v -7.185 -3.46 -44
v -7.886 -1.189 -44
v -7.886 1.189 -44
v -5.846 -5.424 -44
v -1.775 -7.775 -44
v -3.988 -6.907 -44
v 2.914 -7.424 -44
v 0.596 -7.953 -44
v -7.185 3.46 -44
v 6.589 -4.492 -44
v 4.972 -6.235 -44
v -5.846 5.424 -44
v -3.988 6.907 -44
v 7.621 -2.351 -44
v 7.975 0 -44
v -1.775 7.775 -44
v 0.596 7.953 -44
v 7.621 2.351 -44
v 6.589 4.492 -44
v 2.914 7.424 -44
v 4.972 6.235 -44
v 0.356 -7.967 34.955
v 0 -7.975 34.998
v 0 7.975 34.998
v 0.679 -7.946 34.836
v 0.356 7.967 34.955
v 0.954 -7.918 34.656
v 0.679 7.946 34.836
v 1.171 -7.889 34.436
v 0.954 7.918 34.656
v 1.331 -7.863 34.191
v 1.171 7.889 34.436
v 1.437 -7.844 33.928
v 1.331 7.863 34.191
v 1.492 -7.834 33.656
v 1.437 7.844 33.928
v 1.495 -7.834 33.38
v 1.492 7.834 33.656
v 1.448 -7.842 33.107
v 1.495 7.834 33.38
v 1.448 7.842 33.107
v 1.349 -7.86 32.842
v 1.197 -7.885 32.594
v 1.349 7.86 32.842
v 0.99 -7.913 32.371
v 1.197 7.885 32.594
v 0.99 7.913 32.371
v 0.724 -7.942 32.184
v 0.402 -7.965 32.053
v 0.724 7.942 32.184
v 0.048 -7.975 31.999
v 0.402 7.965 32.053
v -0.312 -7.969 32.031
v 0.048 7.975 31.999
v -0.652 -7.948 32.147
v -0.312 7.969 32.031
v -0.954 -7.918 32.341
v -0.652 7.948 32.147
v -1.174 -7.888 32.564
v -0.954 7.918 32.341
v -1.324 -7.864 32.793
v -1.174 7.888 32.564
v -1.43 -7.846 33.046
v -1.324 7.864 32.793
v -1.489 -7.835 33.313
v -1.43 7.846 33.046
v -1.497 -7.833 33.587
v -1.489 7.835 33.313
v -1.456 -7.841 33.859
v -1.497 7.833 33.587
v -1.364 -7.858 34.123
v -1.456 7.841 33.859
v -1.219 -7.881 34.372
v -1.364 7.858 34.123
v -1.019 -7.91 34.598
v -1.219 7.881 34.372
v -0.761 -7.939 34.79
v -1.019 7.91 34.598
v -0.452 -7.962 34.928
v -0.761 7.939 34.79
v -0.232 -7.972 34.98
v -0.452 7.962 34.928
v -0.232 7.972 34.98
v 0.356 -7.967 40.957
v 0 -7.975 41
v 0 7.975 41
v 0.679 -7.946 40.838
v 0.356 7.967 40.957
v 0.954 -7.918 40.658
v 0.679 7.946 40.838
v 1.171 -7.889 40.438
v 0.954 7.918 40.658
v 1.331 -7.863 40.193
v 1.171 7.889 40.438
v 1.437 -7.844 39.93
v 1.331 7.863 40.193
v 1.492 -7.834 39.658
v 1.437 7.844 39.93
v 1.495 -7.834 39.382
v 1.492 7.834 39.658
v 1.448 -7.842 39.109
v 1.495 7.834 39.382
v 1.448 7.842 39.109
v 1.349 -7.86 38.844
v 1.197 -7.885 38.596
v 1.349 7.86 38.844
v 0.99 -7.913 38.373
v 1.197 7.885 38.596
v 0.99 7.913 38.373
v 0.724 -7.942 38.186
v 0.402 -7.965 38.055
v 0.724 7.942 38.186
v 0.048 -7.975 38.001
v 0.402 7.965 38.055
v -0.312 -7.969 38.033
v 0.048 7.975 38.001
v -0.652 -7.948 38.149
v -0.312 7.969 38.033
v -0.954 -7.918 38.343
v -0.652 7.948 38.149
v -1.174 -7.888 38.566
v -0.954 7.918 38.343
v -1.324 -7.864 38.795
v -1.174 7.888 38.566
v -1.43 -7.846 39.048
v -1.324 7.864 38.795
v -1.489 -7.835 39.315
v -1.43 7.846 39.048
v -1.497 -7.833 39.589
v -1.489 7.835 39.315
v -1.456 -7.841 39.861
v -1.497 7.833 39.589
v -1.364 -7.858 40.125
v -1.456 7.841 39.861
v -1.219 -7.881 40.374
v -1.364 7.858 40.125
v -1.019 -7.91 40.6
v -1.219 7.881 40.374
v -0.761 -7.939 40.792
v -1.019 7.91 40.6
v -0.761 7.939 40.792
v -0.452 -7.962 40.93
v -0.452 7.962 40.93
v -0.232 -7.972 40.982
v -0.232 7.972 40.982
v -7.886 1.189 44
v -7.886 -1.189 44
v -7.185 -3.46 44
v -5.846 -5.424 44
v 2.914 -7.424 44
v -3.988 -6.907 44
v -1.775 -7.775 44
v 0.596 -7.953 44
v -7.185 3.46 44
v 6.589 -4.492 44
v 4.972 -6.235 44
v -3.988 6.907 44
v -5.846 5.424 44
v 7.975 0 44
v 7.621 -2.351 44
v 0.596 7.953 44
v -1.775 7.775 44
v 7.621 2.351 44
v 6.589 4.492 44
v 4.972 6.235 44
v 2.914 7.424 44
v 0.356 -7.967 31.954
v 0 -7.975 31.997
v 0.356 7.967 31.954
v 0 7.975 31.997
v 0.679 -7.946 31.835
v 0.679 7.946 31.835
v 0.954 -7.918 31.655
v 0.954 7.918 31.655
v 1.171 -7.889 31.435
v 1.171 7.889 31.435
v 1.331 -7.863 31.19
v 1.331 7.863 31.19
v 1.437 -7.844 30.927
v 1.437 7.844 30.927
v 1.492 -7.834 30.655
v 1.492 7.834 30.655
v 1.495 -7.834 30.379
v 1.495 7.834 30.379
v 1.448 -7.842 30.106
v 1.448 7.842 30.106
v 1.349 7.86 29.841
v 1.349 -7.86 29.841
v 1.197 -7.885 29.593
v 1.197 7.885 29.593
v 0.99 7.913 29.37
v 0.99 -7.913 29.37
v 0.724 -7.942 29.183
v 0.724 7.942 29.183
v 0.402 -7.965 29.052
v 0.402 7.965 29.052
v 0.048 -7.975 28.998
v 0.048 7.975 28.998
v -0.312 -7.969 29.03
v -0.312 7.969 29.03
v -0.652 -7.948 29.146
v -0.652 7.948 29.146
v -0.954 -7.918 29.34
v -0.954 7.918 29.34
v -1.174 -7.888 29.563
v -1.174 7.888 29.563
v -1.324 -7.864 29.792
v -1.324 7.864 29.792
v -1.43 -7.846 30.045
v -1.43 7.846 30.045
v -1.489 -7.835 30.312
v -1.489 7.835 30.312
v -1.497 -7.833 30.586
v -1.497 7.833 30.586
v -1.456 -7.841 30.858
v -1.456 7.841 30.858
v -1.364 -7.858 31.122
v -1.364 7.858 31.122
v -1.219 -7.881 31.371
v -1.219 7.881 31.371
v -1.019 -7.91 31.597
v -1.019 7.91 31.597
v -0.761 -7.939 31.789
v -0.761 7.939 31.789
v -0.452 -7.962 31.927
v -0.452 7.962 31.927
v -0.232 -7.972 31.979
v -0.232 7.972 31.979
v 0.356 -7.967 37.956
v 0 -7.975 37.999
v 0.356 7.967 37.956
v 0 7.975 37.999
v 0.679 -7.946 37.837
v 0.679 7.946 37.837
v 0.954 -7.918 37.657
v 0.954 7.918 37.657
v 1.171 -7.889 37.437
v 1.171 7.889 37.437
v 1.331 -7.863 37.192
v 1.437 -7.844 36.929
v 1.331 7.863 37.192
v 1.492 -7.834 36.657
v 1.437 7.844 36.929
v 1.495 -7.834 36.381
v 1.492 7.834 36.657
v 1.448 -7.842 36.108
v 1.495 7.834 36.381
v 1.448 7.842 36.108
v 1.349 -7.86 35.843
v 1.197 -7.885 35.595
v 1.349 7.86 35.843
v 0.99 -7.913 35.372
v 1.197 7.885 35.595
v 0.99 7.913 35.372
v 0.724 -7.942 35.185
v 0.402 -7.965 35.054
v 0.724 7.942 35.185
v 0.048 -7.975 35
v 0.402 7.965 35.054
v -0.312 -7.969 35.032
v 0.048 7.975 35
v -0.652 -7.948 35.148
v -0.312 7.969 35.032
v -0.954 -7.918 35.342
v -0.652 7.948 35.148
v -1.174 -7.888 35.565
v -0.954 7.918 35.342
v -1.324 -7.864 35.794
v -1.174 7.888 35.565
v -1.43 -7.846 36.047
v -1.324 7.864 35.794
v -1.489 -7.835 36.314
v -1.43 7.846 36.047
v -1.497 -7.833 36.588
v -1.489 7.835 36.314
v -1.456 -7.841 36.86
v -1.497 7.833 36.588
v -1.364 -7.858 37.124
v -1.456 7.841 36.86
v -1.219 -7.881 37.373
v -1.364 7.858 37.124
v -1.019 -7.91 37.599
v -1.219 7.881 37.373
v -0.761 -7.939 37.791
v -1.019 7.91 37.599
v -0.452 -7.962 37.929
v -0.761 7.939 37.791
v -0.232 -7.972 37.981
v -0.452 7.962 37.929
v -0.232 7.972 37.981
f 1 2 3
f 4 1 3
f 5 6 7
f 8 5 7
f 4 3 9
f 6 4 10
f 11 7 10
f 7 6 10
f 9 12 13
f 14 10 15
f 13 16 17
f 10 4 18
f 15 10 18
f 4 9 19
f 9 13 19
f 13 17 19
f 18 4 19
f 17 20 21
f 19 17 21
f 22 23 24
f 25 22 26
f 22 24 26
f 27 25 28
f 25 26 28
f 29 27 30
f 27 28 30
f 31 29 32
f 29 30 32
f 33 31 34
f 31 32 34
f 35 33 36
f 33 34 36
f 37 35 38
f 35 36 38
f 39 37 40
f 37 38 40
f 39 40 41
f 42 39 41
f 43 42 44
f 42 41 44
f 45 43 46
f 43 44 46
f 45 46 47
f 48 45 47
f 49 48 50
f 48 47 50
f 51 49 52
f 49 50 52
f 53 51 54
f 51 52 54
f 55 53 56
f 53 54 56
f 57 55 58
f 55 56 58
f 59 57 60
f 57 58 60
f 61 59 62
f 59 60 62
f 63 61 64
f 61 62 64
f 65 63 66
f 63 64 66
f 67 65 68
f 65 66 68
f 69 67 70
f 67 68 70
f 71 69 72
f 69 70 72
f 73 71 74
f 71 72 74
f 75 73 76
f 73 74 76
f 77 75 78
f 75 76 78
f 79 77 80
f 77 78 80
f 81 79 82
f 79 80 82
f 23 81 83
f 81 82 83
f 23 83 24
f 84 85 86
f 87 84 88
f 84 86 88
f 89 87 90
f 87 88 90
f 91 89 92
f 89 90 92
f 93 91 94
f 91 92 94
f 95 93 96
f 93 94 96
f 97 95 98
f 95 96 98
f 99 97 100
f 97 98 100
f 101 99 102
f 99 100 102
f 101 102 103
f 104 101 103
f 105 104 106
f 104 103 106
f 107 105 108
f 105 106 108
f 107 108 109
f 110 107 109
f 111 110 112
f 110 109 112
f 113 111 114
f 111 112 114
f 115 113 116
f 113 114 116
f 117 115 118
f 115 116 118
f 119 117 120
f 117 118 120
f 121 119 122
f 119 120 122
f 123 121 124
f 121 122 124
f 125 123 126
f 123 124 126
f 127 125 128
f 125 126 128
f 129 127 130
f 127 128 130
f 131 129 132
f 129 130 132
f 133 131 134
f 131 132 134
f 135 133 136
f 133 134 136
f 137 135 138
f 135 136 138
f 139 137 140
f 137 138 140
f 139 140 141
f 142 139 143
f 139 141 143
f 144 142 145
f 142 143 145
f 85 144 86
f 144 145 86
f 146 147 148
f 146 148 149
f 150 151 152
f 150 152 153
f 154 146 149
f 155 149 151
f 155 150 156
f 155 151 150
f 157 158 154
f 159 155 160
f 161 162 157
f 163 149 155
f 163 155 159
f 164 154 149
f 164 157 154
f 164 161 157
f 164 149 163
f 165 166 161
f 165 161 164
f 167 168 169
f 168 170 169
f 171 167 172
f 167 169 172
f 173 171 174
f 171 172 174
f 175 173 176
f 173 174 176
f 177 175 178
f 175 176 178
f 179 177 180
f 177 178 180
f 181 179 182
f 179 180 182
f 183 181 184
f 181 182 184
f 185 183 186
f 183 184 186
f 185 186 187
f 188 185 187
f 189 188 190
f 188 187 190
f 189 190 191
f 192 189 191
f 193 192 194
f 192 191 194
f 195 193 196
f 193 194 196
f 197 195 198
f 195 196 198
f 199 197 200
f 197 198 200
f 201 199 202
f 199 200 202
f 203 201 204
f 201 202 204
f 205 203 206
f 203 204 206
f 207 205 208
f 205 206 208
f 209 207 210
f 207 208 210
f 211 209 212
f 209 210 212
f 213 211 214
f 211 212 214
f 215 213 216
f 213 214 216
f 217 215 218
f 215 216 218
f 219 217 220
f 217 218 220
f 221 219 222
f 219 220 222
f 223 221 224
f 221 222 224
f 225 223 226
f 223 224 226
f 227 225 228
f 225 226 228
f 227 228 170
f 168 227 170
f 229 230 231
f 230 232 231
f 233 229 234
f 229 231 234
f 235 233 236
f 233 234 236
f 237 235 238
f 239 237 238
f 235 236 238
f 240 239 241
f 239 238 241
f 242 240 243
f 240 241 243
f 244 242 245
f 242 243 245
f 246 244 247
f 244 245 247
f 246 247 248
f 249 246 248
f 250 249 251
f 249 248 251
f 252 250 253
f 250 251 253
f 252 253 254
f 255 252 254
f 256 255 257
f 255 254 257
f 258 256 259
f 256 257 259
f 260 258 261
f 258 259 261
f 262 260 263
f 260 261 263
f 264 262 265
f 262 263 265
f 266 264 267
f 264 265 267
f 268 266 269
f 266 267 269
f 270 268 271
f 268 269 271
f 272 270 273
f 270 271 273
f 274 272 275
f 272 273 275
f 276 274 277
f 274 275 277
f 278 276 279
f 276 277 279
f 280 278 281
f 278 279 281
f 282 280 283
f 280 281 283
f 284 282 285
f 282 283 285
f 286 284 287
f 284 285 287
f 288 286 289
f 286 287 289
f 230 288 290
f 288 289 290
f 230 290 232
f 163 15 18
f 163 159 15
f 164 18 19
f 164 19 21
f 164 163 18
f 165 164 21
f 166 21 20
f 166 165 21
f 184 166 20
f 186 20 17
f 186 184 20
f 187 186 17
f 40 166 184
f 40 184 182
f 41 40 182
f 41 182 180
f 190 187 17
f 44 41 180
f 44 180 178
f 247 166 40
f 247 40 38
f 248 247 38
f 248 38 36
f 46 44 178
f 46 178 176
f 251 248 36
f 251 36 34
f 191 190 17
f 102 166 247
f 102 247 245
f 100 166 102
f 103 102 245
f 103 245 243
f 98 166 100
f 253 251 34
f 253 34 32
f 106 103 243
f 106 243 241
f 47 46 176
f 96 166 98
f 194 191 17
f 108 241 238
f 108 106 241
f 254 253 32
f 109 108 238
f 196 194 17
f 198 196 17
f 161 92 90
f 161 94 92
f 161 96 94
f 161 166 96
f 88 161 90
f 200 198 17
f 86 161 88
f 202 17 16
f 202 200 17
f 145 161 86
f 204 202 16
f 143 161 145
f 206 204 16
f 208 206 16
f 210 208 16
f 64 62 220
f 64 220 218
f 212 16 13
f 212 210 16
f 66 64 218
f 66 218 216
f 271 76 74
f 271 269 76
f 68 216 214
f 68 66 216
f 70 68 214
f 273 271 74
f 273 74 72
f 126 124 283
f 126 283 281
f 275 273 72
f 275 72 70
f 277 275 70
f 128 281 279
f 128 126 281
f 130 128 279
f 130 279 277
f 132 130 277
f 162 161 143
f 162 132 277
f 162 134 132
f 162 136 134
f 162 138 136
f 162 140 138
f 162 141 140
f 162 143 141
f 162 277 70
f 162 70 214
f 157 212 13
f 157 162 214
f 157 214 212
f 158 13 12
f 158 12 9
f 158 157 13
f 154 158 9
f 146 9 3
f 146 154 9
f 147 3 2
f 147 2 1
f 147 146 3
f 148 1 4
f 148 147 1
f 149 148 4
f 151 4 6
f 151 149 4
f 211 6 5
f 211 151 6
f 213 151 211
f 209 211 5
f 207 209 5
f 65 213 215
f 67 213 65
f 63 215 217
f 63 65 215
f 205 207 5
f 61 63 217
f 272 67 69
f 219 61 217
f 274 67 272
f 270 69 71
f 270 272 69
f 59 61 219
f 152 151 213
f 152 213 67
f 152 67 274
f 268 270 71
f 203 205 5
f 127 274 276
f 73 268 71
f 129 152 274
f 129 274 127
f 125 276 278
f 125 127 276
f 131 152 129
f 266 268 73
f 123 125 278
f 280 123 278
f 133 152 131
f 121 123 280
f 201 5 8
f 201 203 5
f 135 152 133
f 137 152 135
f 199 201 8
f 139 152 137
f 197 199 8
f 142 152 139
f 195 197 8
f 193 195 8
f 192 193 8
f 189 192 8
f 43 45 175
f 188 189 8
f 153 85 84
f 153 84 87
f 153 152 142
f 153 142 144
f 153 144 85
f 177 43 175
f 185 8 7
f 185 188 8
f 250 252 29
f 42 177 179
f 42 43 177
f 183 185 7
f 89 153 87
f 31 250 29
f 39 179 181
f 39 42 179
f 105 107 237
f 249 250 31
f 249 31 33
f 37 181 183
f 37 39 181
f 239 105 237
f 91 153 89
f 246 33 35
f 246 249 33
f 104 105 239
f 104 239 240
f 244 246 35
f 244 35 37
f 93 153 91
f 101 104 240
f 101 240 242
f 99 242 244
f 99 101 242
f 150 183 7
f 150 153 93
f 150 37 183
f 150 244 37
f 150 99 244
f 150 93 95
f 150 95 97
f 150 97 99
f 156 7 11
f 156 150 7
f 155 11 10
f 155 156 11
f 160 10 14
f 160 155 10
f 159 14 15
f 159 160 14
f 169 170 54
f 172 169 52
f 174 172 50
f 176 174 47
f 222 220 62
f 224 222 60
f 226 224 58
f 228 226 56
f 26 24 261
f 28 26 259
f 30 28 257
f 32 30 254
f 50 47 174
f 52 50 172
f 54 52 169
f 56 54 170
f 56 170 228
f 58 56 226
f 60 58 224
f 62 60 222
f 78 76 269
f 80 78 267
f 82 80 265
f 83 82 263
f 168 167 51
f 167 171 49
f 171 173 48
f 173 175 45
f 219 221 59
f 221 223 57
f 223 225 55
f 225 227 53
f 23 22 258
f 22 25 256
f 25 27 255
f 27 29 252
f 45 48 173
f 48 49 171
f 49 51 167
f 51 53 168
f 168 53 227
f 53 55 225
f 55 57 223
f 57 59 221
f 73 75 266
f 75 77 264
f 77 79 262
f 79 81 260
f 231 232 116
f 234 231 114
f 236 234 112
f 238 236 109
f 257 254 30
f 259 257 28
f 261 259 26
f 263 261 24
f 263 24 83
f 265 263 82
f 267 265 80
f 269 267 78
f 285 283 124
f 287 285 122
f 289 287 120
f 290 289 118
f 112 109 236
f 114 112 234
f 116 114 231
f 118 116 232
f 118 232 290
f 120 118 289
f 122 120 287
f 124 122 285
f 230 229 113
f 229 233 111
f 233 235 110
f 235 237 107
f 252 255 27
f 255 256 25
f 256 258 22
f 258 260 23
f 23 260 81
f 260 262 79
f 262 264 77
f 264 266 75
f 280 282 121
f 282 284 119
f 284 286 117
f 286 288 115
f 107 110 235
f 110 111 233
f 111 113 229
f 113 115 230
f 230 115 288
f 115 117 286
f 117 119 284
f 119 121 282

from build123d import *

# Parameters (mm, degrees)
SKETCH1_R               = 7.975
BOSS_EXTRUDE1_DEPTH     = 44
SKETCH2_R               = 1.5
CUT_EXTRUDE1_DEPTH      = 46.422475164
LPATTERN3_PLANET2_COUNT = 4
LPATTERN3_PLANET2_PITCH = 3.001


with BuildPart() as part:
    # Sketch1 → Boss-Extrude1 (new, symmetric)
    with BuildSketch(Plane.XY):
        Circle(SKETCH1_R)
    extrude(amount=BOSS_EXTRUDE1_DEPTH, both=True)

    # Sketch2 → Cut-Extrude1 (cut, symmetric)
    with BuildSketch(Plane(origin=(0, 0, 0), x_dir=(1, 0, 0), z_dir=(0, 1, 0))):
        with Locations(Location((0, -39.5, 0), (0, 0, 270))):
            Circle(SKETCH2_R)
    cut_extrude1 = extrude(amount=CUT_EXTRUDE1_DEPTH, both=True, mode=Mode.SUBTRACT)

    # LPattern3-Planet2: Cut-Extrude1 ×4
    with Locations(*[(0, 0, -i * LPATTERN3_PLANET2_PITCH) for i in range(1, LPATTERN3_PLANET2_COUNT)]):
        add(cut_extrude1, mode=Mode.SUBTRACT)


solid = part.part
